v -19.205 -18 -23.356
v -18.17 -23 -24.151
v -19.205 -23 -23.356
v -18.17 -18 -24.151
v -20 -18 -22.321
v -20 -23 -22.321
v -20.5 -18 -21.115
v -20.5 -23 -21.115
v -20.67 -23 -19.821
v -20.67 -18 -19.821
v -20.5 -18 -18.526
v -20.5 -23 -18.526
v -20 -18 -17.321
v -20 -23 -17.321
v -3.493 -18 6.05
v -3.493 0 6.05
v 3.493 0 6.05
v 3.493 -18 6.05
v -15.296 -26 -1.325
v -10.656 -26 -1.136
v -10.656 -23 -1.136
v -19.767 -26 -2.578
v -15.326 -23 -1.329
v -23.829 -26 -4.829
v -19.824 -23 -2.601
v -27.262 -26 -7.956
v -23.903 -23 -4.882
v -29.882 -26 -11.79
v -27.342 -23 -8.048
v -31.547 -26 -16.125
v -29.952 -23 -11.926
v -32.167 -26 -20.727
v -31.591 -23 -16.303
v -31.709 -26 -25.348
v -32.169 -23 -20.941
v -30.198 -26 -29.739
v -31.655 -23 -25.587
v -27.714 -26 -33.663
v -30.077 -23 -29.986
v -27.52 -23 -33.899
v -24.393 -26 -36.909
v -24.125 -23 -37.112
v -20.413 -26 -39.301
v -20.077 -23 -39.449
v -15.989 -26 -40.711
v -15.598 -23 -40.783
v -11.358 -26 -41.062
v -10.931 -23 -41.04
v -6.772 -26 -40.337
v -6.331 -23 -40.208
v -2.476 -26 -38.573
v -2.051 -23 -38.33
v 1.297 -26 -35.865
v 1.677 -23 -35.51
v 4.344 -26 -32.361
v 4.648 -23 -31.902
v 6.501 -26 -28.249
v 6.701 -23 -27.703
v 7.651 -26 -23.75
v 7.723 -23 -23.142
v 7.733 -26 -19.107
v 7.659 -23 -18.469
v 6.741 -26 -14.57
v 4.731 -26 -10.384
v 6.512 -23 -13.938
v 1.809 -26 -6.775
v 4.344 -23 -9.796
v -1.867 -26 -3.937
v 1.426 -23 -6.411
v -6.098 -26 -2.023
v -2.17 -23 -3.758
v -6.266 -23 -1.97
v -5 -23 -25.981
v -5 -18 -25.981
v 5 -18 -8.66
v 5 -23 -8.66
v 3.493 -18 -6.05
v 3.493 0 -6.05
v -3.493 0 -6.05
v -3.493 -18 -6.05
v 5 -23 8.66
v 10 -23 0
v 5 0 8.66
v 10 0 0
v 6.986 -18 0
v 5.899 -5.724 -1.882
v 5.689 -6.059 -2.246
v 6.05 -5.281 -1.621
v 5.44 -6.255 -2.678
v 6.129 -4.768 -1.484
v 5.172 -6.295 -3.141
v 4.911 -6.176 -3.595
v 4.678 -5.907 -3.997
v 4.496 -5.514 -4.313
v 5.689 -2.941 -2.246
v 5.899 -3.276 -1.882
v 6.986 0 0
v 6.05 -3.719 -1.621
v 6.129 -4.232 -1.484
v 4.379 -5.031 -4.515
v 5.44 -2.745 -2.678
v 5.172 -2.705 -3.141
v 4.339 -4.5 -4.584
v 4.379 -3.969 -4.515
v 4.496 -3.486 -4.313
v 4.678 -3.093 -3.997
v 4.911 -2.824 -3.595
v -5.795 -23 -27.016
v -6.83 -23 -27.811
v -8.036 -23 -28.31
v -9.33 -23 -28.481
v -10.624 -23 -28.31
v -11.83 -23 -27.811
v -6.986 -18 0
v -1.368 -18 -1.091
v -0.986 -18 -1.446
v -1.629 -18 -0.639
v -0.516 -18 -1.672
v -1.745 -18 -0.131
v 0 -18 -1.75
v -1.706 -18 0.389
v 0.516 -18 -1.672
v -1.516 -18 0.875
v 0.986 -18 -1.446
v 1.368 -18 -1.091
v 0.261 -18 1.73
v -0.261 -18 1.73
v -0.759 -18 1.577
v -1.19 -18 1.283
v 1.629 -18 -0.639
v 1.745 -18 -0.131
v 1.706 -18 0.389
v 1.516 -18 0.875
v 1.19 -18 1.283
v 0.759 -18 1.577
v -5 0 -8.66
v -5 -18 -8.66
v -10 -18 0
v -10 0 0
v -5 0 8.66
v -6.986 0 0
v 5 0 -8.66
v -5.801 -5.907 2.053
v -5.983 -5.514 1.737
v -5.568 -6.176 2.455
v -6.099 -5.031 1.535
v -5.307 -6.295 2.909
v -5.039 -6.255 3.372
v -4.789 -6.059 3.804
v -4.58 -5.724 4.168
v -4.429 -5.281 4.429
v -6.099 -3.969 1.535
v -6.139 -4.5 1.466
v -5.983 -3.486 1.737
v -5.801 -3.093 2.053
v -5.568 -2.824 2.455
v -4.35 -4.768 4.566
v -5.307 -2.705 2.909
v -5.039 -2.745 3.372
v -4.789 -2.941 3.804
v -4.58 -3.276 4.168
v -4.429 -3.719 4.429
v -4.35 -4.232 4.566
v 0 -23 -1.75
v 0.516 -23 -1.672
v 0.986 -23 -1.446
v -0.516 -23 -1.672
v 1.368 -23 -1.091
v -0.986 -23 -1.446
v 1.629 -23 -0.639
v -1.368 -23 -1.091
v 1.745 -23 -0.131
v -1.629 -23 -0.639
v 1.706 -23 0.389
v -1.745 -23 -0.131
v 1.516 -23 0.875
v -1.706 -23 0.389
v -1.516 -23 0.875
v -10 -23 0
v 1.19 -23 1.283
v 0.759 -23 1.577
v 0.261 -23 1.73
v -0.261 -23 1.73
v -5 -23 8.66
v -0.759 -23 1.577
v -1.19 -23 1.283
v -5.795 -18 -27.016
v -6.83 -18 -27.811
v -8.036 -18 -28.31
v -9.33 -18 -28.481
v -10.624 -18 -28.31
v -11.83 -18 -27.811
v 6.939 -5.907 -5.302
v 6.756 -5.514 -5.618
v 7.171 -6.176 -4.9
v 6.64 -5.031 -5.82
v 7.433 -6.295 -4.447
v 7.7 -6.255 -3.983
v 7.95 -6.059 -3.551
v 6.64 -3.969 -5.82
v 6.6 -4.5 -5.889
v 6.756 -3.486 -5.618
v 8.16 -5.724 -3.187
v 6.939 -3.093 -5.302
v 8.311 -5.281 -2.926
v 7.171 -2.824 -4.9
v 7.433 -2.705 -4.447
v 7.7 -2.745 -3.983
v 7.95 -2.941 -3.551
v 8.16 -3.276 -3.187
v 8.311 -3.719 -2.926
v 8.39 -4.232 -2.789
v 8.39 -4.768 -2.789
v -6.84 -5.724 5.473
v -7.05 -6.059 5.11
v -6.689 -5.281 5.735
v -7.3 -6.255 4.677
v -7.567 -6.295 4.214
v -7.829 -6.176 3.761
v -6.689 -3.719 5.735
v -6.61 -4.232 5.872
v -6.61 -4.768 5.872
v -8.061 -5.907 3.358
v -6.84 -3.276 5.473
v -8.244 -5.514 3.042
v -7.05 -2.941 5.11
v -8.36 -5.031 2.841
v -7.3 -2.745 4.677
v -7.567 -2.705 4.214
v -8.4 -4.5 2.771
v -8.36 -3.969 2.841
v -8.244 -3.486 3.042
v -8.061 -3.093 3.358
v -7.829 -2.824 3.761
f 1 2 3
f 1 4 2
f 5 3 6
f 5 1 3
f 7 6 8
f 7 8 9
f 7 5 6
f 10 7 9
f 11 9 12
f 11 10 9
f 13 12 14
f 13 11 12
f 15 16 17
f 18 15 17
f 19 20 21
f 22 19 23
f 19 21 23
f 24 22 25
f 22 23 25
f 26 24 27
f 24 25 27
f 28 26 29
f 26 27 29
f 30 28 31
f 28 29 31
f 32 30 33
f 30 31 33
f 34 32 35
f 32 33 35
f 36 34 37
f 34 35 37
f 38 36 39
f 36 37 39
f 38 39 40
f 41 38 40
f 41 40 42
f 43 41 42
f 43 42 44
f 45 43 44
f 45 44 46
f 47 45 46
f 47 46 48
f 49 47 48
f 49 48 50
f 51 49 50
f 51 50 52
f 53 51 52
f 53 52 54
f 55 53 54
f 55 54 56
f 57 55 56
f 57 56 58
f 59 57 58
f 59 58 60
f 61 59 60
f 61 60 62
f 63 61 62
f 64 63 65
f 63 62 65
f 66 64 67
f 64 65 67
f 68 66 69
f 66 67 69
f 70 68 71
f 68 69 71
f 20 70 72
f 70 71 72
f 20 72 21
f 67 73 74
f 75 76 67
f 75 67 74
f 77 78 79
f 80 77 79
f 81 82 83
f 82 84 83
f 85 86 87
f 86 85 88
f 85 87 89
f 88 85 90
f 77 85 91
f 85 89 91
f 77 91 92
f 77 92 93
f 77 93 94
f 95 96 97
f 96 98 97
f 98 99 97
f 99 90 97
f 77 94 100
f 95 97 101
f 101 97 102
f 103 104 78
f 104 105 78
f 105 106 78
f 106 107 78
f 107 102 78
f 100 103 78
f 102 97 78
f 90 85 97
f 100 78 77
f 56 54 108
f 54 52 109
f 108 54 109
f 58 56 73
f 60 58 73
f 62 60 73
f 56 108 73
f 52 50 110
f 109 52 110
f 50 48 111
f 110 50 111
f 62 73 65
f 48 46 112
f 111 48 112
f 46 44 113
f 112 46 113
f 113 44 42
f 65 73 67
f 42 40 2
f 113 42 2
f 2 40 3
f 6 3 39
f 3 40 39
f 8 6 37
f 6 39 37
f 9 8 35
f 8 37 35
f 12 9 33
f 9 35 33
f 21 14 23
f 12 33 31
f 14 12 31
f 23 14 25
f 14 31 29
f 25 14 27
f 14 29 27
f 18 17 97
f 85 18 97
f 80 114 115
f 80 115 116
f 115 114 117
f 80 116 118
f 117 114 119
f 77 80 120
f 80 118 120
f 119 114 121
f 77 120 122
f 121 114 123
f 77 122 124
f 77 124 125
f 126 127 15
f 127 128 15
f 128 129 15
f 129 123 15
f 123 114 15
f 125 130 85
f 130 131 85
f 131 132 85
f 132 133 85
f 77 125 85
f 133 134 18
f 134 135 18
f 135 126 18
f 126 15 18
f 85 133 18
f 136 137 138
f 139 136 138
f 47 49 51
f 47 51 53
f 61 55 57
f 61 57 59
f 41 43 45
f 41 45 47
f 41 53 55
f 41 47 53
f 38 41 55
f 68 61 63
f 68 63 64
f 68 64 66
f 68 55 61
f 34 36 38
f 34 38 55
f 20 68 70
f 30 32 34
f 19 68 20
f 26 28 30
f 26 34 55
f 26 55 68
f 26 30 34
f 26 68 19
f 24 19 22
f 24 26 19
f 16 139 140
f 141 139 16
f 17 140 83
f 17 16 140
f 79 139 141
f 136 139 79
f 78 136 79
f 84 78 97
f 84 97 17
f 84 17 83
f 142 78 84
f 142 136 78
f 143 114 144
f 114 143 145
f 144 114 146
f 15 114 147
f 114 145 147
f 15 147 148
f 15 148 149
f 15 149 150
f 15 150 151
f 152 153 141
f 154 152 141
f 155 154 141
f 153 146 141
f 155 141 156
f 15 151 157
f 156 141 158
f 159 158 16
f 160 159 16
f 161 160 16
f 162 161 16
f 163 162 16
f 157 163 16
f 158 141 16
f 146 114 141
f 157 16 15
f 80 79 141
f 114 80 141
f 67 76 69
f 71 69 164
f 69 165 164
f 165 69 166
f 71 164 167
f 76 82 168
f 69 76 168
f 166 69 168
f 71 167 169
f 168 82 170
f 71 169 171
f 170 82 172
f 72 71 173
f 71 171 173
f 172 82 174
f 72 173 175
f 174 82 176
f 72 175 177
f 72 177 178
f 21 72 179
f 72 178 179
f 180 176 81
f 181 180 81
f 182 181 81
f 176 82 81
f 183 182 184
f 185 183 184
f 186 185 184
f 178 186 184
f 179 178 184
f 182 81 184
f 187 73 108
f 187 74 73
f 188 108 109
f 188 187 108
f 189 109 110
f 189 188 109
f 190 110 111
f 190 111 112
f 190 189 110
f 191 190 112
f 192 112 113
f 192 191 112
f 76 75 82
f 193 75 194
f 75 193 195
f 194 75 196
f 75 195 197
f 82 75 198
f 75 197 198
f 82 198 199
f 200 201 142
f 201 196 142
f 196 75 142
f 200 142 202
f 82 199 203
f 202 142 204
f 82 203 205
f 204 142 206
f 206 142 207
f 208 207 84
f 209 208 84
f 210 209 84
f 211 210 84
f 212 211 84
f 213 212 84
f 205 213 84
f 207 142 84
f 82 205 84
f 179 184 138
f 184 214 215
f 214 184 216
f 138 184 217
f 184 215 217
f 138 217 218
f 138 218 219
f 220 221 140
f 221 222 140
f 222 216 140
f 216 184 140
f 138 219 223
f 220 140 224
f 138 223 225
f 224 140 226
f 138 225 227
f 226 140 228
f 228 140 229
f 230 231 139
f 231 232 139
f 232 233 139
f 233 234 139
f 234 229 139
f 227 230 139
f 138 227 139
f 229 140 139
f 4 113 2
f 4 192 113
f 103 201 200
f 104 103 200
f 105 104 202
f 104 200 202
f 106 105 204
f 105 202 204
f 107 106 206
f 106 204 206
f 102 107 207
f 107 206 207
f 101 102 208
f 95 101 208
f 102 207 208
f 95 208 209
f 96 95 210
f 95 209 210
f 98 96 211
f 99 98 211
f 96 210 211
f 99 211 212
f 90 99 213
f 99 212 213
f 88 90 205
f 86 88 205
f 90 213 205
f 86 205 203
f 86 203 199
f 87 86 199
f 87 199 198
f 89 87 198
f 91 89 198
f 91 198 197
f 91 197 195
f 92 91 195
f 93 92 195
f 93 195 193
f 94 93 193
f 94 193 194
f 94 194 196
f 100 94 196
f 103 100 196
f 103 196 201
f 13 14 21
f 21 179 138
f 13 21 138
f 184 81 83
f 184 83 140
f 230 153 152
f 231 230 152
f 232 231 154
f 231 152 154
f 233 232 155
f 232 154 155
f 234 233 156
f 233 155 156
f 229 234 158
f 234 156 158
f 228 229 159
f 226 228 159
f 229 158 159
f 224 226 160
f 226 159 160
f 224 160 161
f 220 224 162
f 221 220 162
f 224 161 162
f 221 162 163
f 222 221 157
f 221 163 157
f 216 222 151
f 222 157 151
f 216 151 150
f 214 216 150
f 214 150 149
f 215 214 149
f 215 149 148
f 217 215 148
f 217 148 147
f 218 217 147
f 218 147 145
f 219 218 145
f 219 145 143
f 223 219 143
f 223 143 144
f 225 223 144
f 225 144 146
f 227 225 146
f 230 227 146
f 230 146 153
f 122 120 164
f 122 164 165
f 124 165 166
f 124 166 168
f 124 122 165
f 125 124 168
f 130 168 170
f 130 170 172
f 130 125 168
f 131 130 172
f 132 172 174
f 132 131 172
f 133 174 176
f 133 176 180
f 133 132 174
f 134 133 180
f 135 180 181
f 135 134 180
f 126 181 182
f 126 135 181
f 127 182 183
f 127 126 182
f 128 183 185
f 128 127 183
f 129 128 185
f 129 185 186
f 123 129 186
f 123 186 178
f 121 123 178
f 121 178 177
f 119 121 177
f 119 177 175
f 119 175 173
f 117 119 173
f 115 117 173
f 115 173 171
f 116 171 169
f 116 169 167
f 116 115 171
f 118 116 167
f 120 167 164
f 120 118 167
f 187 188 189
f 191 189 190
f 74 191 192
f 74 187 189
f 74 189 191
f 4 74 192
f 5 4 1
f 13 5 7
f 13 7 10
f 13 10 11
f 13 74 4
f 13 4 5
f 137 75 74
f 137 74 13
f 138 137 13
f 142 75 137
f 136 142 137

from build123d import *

# Parameters (mm, degrees)
EXTRUDE_3_DEPTH     = 18
SKETCH_2_R          = 1.8
CUT_EXTRUDE_1_DEPTH = 17.325
SKETCH_4_R          = 1.75
EXTRUDE_9_DEPTH     = 5
SKETCH_7_W          = 17.320508076
SKETCH_7_H          = 5
EXTRUDE_10_DEPTH    = 25
FILLET_1_R          = 5
FILLET_2_R          = 5
SKETCH_8_R          = 20
EXTRUDE_11_DEPTH    = 3


with BuildPart() as part:
    # 草图1 → 凸台-拉伸3 (new body)
    with BuildSketch(Plane(origin=(0, 0, 0), x_dir=(1, 0, 0), z_dir=(0, 1, 0))):
        Polygon((10, 0), (5, 8.660254038), (-5, 8.660254038), (-10, 0), (-5, -8.660254038), (5, -8.660254038), align=None)
        Polygon((6.985938257, 0), (3.492969129, 6.05), (-3.492969129, 6.05), (-6.985938257, 0), (-3.492969129, -6.05), (3.492969129, -6.05), align=None, mode=Mode.SUBTRACT)
    extrude(amount=-EXTRUDE_3_DEPTH)

    # 草图2 → 切除-拉伸1 (cut)
    with BuildSketch(Plane(origin=(7.5, 0, -4.330127019), x_dir=(-0.5000000000000003, 0, -0.8660254037844386), z_dir=(0.8660254037844386, 0, -0.5000000000000003))):
        with Locations((0, -4.5)):
            Circle(SKETCH_2_R)
    extrude(amount=-CUT_EXTRUDE_1_DEPTH, mode=Mode.SUBTRACT)

    # 草图4 → 凸台-拉伸9 (add)
    with BuildSketch(Plane.XZ.offset(18)):
        Polygon((-10, 0), (5, -8.660254038), (10, 0), (5, 8.660254038), (-5, 8.660254038), align=None)
        with Locations(Location((0, 0, 0), (0, 0, 270))):
            Circle(SKETCH_4_R, mode=Mode.SUBTRACT)
    extrude(amount=EXTRUDE_9_DEPTH)

    # 草图7 → 凸台-拉伸10 (add)
    with BuildSketch(Plane(origin=(-2.5, 0, -4.330127019), x_dir=(-0.8660254037844388, 0, 0.49999999999999983), z_dir=(-0.4999999999999998, 0, -0.8660254037844387))):
        with Locations((0, -20.5)):
            Rectangle(SKETCH_7_W, SKETCH_7_H)
    extrude(amount=EXTRUDE_10_DEPTH)

    # 圆角1
    fillet_1_edges = [part.edges().sort_by_distance(p)[0] for p in [
        (-7.5, -20.5, -30.310889132),
    ]]
    fillet(fillet_1_edges, radius=FILLET_1_R)

    # 圆角2
    fillet_2_edges = [part.edges().sort_by_distance(p)[0] for p in [
        (-22.5, -20.5, -21.650635095),
    ]]
    fillet(fillet_2_edges, radius=FILLET_2_R)

    # 草图8 → 凸台-拉伸11 (add)
    with BuildSketch(Plane.XZ.offset(23)):
        with Locations(Location((-12.169872981, -21.078838325, 0), (0, 0, 85.658906273))):
            Circle(SKETCH_8_R)
    extrude(amount=EXTRUDE_11_DEPTH)


solid = part.part
